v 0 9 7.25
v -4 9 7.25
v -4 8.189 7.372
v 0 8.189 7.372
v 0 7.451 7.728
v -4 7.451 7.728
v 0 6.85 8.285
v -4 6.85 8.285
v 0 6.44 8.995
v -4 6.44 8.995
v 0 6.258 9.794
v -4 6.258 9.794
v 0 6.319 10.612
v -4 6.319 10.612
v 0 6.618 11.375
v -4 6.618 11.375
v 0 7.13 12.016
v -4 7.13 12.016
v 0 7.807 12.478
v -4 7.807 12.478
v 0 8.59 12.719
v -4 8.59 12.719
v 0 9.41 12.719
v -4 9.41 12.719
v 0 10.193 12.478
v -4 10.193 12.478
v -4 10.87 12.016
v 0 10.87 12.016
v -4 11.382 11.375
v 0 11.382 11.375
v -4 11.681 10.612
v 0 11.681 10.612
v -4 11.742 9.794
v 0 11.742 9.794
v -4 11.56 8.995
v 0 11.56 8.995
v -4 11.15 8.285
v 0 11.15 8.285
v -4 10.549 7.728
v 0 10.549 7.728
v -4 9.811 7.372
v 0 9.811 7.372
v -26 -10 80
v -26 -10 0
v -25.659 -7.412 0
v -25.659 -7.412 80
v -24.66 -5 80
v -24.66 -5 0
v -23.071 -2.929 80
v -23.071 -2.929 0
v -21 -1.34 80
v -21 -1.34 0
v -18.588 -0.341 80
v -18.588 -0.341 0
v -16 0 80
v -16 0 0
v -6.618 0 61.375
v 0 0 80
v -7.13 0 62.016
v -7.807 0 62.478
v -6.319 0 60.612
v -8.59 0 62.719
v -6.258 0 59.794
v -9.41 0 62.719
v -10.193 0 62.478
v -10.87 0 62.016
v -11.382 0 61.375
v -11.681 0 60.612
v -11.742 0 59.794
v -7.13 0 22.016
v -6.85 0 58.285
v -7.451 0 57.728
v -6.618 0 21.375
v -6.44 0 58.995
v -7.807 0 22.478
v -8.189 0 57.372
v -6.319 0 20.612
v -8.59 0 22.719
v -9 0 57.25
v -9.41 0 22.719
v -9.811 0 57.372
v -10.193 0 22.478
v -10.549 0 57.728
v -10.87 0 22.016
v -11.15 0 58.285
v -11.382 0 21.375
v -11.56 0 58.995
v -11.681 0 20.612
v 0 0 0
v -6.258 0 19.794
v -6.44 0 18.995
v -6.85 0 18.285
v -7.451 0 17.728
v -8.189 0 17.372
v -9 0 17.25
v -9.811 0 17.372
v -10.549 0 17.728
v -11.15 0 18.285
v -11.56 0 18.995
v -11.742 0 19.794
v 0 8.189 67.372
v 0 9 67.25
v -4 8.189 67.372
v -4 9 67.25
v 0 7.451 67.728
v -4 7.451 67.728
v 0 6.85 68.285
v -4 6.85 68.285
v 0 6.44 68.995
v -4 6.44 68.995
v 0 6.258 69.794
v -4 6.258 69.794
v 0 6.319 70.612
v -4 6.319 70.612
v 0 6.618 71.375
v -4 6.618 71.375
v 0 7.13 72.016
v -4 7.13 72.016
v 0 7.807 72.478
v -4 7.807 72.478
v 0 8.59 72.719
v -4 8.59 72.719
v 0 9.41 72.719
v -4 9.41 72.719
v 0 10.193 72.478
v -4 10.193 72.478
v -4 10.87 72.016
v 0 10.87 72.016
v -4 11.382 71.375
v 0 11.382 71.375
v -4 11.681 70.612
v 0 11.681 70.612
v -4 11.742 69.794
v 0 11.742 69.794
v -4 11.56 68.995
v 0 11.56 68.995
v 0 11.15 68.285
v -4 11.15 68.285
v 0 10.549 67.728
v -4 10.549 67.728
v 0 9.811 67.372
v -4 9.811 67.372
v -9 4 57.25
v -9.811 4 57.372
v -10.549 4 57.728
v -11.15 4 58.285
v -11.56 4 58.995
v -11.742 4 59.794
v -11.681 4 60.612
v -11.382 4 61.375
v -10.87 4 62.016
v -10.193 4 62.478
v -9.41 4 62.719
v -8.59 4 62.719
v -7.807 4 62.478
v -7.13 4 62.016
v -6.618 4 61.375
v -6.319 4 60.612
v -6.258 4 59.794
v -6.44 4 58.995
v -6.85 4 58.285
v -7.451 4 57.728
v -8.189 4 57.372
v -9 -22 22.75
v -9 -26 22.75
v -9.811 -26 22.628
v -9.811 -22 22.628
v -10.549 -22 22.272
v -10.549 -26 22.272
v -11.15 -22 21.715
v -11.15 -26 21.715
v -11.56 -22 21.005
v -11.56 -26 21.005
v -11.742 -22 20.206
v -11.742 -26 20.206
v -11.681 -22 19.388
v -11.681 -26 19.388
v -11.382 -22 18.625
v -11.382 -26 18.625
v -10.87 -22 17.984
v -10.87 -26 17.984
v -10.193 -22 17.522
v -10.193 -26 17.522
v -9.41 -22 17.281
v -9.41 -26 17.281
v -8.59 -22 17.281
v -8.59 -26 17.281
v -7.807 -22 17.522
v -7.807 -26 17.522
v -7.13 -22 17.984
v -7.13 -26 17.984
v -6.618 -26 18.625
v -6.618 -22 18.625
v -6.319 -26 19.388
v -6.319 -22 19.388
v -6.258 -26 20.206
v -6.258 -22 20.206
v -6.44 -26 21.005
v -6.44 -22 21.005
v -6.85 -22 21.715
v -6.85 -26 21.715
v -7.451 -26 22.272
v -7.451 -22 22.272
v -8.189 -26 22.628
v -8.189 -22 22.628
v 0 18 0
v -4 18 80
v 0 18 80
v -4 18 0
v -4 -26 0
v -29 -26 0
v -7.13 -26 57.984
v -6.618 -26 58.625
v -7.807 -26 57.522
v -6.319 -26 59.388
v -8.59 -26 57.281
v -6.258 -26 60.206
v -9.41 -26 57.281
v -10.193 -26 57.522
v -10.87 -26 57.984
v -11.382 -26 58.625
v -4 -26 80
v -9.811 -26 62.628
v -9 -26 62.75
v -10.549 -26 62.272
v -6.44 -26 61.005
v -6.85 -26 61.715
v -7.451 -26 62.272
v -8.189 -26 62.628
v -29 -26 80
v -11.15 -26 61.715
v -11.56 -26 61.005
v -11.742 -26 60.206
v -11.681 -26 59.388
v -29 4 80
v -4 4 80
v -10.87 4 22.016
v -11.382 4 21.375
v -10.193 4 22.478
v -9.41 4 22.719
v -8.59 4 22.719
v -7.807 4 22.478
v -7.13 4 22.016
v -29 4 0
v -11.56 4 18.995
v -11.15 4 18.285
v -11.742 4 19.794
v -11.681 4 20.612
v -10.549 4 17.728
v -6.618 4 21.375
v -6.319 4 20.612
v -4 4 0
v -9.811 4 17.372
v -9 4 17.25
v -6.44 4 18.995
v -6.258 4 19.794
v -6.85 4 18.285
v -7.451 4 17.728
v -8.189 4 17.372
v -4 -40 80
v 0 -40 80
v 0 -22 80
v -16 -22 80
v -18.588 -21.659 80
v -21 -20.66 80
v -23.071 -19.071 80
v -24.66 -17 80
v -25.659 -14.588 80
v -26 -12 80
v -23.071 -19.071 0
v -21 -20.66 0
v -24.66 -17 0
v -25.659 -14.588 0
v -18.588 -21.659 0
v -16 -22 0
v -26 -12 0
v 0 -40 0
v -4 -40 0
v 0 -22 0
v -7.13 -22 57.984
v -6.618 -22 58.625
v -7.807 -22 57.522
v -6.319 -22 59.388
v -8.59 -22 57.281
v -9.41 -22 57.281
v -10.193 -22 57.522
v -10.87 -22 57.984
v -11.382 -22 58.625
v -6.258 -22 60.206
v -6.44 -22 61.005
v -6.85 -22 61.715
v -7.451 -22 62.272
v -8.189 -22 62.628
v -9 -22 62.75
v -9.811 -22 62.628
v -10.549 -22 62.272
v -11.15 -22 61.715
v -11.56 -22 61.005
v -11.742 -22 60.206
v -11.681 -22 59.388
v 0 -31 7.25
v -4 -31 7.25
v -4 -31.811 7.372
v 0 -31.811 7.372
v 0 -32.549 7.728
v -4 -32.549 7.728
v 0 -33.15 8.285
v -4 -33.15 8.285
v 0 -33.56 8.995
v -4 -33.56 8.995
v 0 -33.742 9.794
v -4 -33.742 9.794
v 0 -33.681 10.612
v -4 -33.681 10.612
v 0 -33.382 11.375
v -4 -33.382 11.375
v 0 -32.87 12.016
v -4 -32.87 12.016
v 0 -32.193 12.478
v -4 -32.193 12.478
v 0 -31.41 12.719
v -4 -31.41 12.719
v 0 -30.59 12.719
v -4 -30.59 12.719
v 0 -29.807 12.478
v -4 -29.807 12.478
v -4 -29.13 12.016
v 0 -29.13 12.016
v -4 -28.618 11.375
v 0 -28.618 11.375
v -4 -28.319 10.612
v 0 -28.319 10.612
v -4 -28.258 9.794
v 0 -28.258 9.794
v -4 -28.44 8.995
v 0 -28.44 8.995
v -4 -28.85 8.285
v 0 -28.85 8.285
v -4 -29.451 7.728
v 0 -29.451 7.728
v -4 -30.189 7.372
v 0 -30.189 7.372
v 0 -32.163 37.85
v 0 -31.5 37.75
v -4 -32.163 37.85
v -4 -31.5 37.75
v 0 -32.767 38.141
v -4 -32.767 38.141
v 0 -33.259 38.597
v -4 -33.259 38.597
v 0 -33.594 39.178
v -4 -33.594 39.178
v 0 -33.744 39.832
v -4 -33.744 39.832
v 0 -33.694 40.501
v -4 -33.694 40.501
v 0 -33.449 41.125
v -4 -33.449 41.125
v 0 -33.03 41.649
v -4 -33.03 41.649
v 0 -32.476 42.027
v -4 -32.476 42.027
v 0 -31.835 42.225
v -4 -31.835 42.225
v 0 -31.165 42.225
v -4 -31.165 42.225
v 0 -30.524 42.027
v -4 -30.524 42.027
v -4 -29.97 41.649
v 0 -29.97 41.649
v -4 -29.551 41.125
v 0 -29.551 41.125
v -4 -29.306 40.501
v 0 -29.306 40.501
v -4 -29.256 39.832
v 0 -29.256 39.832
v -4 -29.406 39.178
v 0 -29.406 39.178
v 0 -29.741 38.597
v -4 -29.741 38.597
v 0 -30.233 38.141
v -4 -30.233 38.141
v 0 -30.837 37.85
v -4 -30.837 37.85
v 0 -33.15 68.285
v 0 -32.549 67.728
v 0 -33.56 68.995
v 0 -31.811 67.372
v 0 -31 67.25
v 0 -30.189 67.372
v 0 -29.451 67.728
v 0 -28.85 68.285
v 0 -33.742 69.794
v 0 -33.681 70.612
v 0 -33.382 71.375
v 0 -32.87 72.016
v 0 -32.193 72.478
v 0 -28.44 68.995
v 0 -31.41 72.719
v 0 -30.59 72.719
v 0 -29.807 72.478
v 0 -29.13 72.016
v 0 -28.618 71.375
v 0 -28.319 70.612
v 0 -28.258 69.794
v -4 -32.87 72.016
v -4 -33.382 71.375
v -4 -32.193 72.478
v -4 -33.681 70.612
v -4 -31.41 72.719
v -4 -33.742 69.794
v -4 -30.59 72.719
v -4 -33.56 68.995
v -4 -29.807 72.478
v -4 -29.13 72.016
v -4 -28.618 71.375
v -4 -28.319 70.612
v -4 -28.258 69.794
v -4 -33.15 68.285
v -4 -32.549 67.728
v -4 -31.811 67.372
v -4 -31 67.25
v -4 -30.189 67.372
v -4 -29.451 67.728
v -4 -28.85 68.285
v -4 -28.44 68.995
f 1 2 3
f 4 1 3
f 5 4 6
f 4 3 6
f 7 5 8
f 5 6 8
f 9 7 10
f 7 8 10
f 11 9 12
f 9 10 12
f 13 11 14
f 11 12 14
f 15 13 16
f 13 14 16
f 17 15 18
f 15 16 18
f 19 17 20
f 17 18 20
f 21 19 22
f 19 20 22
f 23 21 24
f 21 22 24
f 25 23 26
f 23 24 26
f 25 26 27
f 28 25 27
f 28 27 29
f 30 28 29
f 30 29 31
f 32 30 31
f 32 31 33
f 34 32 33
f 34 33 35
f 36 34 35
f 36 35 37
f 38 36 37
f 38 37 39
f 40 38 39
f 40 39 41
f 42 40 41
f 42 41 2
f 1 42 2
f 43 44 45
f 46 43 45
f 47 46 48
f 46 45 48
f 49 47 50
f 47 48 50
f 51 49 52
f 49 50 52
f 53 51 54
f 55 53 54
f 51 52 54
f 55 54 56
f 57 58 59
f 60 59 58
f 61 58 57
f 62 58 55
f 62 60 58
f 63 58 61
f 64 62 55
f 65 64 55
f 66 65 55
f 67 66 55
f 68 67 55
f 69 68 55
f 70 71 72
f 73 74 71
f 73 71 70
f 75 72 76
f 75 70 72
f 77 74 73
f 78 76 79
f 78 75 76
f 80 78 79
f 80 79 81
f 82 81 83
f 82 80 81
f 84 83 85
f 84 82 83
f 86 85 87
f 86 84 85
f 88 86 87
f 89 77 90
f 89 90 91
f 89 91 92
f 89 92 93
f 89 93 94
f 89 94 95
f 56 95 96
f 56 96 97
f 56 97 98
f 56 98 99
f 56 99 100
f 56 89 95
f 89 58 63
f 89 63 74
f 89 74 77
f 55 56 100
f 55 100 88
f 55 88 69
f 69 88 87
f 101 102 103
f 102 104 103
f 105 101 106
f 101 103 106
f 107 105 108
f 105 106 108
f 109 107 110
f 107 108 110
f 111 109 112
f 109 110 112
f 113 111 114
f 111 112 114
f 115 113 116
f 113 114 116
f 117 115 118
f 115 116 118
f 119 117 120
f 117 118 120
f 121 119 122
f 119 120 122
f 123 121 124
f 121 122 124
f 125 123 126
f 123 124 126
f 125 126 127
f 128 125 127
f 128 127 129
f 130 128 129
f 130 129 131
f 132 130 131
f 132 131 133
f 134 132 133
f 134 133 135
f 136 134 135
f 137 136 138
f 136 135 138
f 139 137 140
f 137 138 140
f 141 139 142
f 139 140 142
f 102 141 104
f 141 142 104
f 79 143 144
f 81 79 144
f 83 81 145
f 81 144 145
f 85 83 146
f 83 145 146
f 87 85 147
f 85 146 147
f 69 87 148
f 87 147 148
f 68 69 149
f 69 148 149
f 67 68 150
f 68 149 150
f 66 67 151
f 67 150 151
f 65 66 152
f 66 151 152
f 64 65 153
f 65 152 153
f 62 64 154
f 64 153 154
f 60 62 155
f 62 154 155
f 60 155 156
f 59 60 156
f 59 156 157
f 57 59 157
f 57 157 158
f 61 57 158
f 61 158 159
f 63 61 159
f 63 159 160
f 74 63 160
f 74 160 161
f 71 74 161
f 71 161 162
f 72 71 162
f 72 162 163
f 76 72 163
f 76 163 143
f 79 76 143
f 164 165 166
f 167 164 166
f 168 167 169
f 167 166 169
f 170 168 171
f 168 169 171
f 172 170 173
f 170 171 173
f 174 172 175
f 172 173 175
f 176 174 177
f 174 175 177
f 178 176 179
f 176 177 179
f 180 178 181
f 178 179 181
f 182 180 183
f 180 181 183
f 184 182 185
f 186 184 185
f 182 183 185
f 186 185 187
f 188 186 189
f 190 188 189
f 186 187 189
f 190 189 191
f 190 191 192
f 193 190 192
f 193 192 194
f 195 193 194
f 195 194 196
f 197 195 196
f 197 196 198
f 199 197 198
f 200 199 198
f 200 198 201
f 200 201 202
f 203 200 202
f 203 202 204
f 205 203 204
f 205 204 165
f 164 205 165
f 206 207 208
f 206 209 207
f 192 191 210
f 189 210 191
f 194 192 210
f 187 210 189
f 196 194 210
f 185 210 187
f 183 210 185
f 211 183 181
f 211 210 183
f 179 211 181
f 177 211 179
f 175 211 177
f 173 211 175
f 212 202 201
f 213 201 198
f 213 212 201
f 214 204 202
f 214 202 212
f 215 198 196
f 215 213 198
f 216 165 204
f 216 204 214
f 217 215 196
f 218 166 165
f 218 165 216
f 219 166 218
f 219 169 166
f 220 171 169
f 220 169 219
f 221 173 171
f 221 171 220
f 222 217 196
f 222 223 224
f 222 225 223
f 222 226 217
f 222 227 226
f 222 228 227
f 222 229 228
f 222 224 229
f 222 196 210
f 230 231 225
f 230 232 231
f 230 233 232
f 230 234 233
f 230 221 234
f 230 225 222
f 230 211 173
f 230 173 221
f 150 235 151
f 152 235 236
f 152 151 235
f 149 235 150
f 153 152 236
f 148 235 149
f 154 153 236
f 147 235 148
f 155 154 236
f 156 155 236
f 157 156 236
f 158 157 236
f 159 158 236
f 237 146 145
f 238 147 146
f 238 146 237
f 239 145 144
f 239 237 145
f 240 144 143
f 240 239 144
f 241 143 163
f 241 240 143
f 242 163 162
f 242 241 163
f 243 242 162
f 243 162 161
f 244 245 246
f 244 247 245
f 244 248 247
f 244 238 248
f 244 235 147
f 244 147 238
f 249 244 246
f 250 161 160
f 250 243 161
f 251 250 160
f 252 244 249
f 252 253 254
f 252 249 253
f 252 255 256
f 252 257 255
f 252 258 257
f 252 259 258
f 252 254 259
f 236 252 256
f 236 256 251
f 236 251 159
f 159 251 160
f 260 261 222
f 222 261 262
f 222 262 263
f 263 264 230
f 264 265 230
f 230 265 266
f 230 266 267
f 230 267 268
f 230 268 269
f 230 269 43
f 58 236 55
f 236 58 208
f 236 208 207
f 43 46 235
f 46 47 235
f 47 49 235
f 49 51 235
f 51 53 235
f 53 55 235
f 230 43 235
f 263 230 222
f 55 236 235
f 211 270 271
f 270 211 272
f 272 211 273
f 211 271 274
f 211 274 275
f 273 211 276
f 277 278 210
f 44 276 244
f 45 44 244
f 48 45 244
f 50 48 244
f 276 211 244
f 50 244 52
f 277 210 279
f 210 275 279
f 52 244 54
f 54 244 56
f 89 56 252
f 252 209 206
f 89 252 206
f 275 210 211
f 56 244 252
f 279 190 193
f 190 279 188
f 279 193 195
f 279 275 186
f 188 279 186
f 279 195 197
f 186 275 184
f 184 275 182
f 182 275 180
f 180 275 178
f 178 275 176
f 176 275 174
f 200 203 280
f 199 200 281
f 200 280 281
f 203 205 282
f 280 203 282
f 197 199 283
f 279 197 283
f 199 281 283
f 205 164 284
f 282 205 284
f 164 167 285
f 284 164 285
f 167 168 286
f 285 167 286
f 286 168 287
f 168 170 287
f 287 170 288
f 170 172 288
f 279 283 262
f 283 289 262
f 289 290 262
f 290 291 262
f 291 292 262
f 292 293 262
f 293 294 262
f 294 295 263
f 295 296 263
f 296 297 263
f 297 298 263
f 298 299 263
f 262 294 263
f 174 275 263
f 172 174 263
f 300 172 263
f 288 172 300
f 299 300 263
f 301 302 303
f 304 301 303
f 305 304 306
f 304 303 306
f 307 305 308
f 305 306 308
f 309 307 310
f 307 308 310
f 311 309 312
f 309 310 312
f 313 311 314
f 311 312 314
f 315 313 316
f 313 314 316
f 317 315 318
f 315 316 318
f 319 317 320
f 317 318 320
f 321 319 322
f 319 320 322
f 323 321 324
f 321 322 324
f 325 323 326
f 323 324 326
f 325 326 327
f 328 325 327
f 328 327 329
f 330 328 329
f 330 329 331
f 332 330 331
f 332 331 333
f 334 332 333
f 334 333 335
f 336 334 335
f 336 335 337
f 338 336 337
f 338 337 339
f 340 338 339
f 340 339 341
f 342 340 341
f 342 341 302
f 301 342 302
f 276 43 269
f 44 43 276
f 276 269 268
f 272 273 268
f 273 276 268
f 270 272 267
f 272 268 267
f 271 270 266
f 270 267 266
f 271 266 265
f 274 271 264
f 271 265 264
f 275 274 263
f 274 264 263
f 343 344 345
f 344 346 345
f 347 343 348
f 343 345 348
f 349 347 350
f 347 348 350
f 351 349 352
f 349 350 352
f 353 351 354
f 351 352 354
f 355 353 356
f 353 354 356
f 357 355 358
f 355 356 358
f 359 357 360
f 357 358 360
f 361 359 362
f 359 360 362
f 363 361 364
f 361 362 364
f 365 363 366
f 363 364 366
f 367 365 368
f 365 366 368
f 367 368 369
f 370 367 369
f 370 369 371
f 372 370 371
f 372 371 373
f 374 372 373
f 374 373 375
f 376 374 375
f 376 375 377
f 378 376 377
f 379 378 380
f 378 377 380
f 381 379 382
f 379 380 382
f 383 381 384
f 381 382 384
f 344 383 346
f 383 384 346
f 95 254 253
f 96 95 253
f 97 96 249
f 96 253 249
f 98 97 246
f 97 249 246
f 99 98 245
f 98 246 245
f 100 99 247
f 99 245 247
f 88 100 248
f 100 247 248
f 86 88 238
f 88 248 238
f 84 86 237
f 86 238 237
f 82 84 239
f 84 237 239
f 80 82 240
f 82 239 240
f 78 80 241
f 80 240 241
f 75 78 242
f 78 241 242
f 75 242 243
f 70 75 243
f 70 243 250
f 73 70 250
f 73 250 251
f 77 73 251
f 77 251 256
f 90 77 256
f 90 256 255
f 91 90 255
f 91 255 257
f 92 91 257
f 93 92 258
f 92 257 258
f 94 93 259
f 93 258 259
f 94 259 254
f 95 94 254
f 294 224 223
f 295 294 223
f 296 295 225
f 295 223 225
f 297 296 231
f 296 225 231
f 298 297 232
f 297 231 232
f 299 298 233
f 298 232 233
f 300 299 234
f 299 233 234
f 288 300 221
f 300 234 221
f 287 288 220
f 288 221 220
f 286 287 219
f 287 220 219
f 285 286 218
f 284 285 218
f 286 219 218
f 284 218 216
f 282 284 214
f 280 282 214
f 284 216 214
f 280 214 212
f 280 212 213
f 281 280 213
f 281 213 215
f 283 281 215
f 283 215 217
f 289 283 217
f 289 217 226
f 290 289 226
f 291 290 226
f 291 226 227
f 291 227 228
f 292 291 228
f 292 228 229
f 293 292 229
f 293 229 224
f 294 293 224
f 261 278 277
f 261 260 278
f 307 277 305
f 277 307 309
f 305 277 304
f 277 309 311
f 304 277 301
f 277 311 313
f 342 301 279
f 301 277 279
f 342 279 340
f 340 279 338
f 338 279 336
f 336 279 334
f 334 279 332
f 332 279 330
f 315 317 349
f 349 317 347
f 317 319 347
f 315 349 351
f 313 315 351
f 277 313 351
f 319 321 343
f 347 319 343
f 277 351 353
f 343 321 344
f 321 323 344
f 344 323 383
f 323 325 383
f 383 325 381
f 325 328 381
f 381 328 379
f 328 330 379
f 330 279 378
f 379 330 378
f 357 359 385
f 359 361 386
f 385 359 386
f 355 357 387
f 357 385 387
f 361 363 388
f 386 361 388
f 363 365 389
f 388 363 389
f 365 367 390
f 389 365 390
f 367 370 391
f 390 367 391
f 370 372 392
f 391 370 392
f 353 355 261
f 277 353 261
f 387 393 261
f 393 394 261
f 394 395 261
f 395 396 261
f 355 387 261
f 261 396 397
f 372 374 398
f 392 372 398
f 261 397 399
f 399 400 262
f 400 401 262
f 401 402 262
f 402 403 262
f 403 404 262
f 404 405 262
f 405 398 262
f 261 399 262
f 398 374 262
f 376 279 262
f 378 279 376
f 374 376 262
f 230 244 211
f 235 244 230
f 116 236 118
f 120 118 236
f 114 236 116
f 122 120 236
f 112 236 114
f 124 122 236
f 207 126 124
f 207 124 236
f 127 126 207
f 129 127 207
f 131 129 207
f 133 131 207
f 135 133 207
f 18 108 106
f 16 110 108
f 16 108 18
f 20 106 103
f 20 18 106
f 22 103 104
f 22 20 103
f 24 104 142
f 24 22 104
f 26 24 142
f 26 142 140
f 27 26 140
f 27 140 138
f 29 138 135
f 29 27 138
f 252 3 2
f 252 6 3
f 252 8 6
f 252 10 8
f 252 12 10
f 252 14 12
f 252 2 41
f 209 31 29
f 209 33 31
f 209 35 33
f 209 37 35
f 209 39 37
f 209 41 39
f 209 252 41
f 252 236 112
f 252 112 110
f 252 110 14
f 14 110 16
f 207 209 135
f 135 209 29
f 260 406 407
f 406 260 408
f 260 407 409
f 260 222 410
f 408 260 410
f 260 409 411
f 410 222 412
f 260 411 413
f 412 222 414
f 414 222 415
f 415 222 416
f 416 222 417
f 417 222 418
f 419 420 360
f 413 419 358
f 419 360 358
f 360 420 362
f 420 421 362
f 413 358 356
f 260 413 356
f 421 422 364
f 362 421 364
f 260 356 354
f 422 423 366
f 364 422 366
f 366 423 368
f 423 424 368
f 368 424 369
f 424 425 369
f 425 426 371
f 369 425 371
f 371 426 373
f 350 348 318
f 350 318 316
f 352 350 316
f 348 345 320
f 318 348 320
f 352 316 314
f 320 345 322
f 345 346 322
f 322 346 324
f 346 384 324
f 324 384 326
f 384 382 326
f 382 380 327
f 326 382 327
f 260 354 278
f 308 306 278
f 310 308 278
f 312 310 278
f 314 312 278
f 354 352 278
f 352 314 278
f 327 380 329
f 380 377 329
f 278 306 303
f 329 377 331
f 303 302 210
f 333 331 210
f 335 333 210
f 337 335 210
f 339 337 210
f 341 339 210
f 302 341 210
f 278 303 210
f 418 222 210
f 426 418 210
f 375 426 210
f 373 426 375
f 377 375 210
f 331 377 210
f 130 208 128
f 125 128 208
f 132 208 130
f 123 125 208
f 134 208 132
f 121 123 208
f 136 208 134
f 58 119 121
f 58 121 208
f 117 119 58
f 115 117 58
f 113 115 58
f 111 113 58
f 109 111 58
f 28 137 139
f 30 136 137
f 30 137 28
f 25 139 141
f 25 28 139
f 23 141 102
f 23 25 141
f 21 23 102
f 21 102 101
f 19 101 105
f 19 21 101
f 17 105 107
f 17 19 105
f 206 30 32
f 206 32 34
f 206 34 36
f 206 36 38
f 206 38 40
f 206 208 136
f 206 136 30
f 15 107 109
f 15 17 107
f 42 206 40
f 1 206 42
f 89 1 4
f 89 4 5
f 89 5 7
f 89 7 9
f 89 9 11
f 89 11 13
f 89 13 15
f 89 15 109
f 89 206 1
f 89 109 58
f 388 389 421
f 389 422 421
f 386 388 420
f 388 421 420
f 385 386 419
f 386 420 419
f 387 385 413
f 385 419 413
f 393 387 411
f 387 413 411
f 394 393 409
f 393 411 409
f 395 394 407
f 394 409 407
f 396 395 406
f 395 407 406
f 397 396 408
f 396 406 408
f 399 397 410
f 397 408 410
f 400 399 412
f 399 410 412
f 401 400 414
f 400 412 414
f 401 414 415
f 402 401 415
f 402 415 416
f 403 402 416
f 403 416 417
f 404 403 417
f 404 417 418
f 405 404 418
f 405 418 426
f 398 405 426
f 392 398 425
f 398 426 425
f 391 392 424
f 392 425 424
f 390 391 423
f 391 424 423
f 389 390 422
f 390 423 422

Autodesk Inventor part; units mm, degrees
ref_plane "YZ Plane" through (0, 0, 0) normal (1, 0, 0) x (0, 1, 0)
ref_plane "XZ Plane" through (0, 0, 0) normal (0, 1, 0) x (-1, 0, 0)
ref_plane "XY Plane" through (0, 0, 0) normal (0, 0, 1) x (1, 0, 0)
sketch "Sketch1" plane through (0, 0, 0) normal (0, 0, 1) x (1, 0, 0)
  line L0 (0, 0) -> (-29, 0)
  line L1 (-29, 0) -> (-29, 4)
  line L2 (-29, 4) -> (-4, 4)
  line L3 (-4, 4) -> (-4, 18)
  line L4 (-4, 18) -> (0, 18)
  line L5 (0, 18) -> (0, 0)
  dimension "d0" = 4
  dimension "d1" = 4
  dimension "d2" = 29
  dimension "d3" = 18
extrude "Extrusion1" add sketch "Sketch1" along normal blind 80
sketch "Sketch3" plane through (0, 0, 0) normal (1, 0, 0) x (0, 0, -1)
  line L0 (0, 0) -> (-80, 0) projected
  line L1 (-80, 0) -> (-80, 18) projected
  line L2 (0, 0) -> (0, 18) projected
  point P0 (-70, 9)
  point P1 (-10, 9)
  dimension "d9" = 9
  dimension "d10" = 10
  dimension "d11" = 10
hole "Hole1" at (0, 9, 70) at (0, 9, 10) direction (-1, 0, 0) diameter 5.5 end through all
sketch "Sketch4" plane through (-29, 0, 0) normal (0, -1, 0) x (1, 0, 0)
  line L0 (29, 0) -> (29, 80) projected
  line L1 (0, 0) -> (29, 0) projected
  point P0 (20, 60)
  point P1 (20, 20)
  dimension "d19" = 9
  dimension "d20" = 20
  dimension "d21" = 20
hole "Hole2" at (-9, 0, 60) at (-9, 0, 20) direction (0, 1, 0) diameter 5.5 end through all
sketch "Sketch9" plane through (-29, 0, 0) normal (0, -1, 0) x (1, 0, 0)
  line L0 (25, 80) -> (0, 80) projected
  line L1 (25, 0) -> (0, 0) projected
  line L2 (0, 80) -> (3, 80)
  line L3 (3, 80) -> (3, 0)
  line L4 (3, 0) -> (0, 0)
  line L5 (0, 0) -> (0, 80)
  point P0 (29, 0)
  point P1 (3, 80)
  dimension "d57" = 3
extrude "Extrusion5" add sketch "Sketch9" along normal blind 26
sketch "Sketch10" plane through (-26, 0, 80) normal (1, 0, 0) x (0, 0, -1)
  line L0 (80, -26) -> (0, -26) projected
  line L1 (80, 4) -> (80, -26) projected
  line L2 (0, -26) -> (80, -26)
  line L3 (80, -26) -> (80, -22)
  line L4 (80, -22) -> (0, -22)
  line L5 (0, -22) -> (0, -26)
  point P0 (80, 0)
  dimension "d60" = 4
extrude "Extrusion6" add sketch "Sketch10" along normal blind 26
sketch "Sketch11" plane through (-29, -26, 0) normal (0, -1, 0) x (1, 0, 0)
  line L0 (29, 80) -> (25, 80) projected
  line L1 (25, 0) -> (0, 0) projected
  line L2 (29, 80) -> (25, 80)
  line L3 (25, 80) -> (25, 0)
  line L4 (25, 0) -> (29, 0)
  line L5 (29, 0) -> (29, 80)
  point P0 (29, 0)
  dimension "d63" = 4
extrude "Extrusion7" add sketch "Sketch11" along normal blind 14
sketch "Sketch12" plane through (0, 0, 80) normal (1, 0, 0) x (0, 0, -1)
  circle A0 centre (10, 9) radius 2.75 projected
  circle A1 centre (70, 9) radius 2.75 projected
  line L0 (80, 18) -> (0, 18) projected
  line L1 (80, -40) -> (0, -40) projected
  line L2 (80, -22) -> (0, -22) projected
  point P0 (80, 0)
  point P1 (10, -31)
  point P2 (70, -31)
  point P3 (51, 18)
  dimension "d66" = 9
  dimension "d85" = 9
hole "Hole5" at (0, -31, 70) at (0, -31, 10) direction (-1, 0, 0) diameter 5.5 end through all
sketch "Sketch14" plane through (-26, -22, 80) normal (0, 1, 0) x (1, 0, 0)
  circle A0 centre (17, 20) radius 2.75 projected
  circle A1 centre (17, 60) radius 2.75 projected
  point P0 (26, 80)
hole "Hole6" at (-9, -22, 60) at (-9, -22, 20) direction (0, -1, 0) diameter 5.5 end through all
sketch "Sketch24" plane through (0, 0, 80) normal (1, 0, 0) x (0, 0, -1)
  line L0 (80, -40) -> (0, -40) projected
  line L1 (0, -22) -> (0, -40) projected
  point P0 (80, 0)
  point P1 (40, -31.5)
  dimension "d157" = 8.5
  dimension "d158" = 40
hole "Hole9" at (0, -31.5, 40) direction (-1, 0, 0) diameter 4.5 depth 8 tip angle 118
fillet "Fillet1" radius 10 2 edges at (-26, -22, 40) (-26, 0, 40)
equation "\"d11\" = d10"
equation "\"d21\" = d20"
